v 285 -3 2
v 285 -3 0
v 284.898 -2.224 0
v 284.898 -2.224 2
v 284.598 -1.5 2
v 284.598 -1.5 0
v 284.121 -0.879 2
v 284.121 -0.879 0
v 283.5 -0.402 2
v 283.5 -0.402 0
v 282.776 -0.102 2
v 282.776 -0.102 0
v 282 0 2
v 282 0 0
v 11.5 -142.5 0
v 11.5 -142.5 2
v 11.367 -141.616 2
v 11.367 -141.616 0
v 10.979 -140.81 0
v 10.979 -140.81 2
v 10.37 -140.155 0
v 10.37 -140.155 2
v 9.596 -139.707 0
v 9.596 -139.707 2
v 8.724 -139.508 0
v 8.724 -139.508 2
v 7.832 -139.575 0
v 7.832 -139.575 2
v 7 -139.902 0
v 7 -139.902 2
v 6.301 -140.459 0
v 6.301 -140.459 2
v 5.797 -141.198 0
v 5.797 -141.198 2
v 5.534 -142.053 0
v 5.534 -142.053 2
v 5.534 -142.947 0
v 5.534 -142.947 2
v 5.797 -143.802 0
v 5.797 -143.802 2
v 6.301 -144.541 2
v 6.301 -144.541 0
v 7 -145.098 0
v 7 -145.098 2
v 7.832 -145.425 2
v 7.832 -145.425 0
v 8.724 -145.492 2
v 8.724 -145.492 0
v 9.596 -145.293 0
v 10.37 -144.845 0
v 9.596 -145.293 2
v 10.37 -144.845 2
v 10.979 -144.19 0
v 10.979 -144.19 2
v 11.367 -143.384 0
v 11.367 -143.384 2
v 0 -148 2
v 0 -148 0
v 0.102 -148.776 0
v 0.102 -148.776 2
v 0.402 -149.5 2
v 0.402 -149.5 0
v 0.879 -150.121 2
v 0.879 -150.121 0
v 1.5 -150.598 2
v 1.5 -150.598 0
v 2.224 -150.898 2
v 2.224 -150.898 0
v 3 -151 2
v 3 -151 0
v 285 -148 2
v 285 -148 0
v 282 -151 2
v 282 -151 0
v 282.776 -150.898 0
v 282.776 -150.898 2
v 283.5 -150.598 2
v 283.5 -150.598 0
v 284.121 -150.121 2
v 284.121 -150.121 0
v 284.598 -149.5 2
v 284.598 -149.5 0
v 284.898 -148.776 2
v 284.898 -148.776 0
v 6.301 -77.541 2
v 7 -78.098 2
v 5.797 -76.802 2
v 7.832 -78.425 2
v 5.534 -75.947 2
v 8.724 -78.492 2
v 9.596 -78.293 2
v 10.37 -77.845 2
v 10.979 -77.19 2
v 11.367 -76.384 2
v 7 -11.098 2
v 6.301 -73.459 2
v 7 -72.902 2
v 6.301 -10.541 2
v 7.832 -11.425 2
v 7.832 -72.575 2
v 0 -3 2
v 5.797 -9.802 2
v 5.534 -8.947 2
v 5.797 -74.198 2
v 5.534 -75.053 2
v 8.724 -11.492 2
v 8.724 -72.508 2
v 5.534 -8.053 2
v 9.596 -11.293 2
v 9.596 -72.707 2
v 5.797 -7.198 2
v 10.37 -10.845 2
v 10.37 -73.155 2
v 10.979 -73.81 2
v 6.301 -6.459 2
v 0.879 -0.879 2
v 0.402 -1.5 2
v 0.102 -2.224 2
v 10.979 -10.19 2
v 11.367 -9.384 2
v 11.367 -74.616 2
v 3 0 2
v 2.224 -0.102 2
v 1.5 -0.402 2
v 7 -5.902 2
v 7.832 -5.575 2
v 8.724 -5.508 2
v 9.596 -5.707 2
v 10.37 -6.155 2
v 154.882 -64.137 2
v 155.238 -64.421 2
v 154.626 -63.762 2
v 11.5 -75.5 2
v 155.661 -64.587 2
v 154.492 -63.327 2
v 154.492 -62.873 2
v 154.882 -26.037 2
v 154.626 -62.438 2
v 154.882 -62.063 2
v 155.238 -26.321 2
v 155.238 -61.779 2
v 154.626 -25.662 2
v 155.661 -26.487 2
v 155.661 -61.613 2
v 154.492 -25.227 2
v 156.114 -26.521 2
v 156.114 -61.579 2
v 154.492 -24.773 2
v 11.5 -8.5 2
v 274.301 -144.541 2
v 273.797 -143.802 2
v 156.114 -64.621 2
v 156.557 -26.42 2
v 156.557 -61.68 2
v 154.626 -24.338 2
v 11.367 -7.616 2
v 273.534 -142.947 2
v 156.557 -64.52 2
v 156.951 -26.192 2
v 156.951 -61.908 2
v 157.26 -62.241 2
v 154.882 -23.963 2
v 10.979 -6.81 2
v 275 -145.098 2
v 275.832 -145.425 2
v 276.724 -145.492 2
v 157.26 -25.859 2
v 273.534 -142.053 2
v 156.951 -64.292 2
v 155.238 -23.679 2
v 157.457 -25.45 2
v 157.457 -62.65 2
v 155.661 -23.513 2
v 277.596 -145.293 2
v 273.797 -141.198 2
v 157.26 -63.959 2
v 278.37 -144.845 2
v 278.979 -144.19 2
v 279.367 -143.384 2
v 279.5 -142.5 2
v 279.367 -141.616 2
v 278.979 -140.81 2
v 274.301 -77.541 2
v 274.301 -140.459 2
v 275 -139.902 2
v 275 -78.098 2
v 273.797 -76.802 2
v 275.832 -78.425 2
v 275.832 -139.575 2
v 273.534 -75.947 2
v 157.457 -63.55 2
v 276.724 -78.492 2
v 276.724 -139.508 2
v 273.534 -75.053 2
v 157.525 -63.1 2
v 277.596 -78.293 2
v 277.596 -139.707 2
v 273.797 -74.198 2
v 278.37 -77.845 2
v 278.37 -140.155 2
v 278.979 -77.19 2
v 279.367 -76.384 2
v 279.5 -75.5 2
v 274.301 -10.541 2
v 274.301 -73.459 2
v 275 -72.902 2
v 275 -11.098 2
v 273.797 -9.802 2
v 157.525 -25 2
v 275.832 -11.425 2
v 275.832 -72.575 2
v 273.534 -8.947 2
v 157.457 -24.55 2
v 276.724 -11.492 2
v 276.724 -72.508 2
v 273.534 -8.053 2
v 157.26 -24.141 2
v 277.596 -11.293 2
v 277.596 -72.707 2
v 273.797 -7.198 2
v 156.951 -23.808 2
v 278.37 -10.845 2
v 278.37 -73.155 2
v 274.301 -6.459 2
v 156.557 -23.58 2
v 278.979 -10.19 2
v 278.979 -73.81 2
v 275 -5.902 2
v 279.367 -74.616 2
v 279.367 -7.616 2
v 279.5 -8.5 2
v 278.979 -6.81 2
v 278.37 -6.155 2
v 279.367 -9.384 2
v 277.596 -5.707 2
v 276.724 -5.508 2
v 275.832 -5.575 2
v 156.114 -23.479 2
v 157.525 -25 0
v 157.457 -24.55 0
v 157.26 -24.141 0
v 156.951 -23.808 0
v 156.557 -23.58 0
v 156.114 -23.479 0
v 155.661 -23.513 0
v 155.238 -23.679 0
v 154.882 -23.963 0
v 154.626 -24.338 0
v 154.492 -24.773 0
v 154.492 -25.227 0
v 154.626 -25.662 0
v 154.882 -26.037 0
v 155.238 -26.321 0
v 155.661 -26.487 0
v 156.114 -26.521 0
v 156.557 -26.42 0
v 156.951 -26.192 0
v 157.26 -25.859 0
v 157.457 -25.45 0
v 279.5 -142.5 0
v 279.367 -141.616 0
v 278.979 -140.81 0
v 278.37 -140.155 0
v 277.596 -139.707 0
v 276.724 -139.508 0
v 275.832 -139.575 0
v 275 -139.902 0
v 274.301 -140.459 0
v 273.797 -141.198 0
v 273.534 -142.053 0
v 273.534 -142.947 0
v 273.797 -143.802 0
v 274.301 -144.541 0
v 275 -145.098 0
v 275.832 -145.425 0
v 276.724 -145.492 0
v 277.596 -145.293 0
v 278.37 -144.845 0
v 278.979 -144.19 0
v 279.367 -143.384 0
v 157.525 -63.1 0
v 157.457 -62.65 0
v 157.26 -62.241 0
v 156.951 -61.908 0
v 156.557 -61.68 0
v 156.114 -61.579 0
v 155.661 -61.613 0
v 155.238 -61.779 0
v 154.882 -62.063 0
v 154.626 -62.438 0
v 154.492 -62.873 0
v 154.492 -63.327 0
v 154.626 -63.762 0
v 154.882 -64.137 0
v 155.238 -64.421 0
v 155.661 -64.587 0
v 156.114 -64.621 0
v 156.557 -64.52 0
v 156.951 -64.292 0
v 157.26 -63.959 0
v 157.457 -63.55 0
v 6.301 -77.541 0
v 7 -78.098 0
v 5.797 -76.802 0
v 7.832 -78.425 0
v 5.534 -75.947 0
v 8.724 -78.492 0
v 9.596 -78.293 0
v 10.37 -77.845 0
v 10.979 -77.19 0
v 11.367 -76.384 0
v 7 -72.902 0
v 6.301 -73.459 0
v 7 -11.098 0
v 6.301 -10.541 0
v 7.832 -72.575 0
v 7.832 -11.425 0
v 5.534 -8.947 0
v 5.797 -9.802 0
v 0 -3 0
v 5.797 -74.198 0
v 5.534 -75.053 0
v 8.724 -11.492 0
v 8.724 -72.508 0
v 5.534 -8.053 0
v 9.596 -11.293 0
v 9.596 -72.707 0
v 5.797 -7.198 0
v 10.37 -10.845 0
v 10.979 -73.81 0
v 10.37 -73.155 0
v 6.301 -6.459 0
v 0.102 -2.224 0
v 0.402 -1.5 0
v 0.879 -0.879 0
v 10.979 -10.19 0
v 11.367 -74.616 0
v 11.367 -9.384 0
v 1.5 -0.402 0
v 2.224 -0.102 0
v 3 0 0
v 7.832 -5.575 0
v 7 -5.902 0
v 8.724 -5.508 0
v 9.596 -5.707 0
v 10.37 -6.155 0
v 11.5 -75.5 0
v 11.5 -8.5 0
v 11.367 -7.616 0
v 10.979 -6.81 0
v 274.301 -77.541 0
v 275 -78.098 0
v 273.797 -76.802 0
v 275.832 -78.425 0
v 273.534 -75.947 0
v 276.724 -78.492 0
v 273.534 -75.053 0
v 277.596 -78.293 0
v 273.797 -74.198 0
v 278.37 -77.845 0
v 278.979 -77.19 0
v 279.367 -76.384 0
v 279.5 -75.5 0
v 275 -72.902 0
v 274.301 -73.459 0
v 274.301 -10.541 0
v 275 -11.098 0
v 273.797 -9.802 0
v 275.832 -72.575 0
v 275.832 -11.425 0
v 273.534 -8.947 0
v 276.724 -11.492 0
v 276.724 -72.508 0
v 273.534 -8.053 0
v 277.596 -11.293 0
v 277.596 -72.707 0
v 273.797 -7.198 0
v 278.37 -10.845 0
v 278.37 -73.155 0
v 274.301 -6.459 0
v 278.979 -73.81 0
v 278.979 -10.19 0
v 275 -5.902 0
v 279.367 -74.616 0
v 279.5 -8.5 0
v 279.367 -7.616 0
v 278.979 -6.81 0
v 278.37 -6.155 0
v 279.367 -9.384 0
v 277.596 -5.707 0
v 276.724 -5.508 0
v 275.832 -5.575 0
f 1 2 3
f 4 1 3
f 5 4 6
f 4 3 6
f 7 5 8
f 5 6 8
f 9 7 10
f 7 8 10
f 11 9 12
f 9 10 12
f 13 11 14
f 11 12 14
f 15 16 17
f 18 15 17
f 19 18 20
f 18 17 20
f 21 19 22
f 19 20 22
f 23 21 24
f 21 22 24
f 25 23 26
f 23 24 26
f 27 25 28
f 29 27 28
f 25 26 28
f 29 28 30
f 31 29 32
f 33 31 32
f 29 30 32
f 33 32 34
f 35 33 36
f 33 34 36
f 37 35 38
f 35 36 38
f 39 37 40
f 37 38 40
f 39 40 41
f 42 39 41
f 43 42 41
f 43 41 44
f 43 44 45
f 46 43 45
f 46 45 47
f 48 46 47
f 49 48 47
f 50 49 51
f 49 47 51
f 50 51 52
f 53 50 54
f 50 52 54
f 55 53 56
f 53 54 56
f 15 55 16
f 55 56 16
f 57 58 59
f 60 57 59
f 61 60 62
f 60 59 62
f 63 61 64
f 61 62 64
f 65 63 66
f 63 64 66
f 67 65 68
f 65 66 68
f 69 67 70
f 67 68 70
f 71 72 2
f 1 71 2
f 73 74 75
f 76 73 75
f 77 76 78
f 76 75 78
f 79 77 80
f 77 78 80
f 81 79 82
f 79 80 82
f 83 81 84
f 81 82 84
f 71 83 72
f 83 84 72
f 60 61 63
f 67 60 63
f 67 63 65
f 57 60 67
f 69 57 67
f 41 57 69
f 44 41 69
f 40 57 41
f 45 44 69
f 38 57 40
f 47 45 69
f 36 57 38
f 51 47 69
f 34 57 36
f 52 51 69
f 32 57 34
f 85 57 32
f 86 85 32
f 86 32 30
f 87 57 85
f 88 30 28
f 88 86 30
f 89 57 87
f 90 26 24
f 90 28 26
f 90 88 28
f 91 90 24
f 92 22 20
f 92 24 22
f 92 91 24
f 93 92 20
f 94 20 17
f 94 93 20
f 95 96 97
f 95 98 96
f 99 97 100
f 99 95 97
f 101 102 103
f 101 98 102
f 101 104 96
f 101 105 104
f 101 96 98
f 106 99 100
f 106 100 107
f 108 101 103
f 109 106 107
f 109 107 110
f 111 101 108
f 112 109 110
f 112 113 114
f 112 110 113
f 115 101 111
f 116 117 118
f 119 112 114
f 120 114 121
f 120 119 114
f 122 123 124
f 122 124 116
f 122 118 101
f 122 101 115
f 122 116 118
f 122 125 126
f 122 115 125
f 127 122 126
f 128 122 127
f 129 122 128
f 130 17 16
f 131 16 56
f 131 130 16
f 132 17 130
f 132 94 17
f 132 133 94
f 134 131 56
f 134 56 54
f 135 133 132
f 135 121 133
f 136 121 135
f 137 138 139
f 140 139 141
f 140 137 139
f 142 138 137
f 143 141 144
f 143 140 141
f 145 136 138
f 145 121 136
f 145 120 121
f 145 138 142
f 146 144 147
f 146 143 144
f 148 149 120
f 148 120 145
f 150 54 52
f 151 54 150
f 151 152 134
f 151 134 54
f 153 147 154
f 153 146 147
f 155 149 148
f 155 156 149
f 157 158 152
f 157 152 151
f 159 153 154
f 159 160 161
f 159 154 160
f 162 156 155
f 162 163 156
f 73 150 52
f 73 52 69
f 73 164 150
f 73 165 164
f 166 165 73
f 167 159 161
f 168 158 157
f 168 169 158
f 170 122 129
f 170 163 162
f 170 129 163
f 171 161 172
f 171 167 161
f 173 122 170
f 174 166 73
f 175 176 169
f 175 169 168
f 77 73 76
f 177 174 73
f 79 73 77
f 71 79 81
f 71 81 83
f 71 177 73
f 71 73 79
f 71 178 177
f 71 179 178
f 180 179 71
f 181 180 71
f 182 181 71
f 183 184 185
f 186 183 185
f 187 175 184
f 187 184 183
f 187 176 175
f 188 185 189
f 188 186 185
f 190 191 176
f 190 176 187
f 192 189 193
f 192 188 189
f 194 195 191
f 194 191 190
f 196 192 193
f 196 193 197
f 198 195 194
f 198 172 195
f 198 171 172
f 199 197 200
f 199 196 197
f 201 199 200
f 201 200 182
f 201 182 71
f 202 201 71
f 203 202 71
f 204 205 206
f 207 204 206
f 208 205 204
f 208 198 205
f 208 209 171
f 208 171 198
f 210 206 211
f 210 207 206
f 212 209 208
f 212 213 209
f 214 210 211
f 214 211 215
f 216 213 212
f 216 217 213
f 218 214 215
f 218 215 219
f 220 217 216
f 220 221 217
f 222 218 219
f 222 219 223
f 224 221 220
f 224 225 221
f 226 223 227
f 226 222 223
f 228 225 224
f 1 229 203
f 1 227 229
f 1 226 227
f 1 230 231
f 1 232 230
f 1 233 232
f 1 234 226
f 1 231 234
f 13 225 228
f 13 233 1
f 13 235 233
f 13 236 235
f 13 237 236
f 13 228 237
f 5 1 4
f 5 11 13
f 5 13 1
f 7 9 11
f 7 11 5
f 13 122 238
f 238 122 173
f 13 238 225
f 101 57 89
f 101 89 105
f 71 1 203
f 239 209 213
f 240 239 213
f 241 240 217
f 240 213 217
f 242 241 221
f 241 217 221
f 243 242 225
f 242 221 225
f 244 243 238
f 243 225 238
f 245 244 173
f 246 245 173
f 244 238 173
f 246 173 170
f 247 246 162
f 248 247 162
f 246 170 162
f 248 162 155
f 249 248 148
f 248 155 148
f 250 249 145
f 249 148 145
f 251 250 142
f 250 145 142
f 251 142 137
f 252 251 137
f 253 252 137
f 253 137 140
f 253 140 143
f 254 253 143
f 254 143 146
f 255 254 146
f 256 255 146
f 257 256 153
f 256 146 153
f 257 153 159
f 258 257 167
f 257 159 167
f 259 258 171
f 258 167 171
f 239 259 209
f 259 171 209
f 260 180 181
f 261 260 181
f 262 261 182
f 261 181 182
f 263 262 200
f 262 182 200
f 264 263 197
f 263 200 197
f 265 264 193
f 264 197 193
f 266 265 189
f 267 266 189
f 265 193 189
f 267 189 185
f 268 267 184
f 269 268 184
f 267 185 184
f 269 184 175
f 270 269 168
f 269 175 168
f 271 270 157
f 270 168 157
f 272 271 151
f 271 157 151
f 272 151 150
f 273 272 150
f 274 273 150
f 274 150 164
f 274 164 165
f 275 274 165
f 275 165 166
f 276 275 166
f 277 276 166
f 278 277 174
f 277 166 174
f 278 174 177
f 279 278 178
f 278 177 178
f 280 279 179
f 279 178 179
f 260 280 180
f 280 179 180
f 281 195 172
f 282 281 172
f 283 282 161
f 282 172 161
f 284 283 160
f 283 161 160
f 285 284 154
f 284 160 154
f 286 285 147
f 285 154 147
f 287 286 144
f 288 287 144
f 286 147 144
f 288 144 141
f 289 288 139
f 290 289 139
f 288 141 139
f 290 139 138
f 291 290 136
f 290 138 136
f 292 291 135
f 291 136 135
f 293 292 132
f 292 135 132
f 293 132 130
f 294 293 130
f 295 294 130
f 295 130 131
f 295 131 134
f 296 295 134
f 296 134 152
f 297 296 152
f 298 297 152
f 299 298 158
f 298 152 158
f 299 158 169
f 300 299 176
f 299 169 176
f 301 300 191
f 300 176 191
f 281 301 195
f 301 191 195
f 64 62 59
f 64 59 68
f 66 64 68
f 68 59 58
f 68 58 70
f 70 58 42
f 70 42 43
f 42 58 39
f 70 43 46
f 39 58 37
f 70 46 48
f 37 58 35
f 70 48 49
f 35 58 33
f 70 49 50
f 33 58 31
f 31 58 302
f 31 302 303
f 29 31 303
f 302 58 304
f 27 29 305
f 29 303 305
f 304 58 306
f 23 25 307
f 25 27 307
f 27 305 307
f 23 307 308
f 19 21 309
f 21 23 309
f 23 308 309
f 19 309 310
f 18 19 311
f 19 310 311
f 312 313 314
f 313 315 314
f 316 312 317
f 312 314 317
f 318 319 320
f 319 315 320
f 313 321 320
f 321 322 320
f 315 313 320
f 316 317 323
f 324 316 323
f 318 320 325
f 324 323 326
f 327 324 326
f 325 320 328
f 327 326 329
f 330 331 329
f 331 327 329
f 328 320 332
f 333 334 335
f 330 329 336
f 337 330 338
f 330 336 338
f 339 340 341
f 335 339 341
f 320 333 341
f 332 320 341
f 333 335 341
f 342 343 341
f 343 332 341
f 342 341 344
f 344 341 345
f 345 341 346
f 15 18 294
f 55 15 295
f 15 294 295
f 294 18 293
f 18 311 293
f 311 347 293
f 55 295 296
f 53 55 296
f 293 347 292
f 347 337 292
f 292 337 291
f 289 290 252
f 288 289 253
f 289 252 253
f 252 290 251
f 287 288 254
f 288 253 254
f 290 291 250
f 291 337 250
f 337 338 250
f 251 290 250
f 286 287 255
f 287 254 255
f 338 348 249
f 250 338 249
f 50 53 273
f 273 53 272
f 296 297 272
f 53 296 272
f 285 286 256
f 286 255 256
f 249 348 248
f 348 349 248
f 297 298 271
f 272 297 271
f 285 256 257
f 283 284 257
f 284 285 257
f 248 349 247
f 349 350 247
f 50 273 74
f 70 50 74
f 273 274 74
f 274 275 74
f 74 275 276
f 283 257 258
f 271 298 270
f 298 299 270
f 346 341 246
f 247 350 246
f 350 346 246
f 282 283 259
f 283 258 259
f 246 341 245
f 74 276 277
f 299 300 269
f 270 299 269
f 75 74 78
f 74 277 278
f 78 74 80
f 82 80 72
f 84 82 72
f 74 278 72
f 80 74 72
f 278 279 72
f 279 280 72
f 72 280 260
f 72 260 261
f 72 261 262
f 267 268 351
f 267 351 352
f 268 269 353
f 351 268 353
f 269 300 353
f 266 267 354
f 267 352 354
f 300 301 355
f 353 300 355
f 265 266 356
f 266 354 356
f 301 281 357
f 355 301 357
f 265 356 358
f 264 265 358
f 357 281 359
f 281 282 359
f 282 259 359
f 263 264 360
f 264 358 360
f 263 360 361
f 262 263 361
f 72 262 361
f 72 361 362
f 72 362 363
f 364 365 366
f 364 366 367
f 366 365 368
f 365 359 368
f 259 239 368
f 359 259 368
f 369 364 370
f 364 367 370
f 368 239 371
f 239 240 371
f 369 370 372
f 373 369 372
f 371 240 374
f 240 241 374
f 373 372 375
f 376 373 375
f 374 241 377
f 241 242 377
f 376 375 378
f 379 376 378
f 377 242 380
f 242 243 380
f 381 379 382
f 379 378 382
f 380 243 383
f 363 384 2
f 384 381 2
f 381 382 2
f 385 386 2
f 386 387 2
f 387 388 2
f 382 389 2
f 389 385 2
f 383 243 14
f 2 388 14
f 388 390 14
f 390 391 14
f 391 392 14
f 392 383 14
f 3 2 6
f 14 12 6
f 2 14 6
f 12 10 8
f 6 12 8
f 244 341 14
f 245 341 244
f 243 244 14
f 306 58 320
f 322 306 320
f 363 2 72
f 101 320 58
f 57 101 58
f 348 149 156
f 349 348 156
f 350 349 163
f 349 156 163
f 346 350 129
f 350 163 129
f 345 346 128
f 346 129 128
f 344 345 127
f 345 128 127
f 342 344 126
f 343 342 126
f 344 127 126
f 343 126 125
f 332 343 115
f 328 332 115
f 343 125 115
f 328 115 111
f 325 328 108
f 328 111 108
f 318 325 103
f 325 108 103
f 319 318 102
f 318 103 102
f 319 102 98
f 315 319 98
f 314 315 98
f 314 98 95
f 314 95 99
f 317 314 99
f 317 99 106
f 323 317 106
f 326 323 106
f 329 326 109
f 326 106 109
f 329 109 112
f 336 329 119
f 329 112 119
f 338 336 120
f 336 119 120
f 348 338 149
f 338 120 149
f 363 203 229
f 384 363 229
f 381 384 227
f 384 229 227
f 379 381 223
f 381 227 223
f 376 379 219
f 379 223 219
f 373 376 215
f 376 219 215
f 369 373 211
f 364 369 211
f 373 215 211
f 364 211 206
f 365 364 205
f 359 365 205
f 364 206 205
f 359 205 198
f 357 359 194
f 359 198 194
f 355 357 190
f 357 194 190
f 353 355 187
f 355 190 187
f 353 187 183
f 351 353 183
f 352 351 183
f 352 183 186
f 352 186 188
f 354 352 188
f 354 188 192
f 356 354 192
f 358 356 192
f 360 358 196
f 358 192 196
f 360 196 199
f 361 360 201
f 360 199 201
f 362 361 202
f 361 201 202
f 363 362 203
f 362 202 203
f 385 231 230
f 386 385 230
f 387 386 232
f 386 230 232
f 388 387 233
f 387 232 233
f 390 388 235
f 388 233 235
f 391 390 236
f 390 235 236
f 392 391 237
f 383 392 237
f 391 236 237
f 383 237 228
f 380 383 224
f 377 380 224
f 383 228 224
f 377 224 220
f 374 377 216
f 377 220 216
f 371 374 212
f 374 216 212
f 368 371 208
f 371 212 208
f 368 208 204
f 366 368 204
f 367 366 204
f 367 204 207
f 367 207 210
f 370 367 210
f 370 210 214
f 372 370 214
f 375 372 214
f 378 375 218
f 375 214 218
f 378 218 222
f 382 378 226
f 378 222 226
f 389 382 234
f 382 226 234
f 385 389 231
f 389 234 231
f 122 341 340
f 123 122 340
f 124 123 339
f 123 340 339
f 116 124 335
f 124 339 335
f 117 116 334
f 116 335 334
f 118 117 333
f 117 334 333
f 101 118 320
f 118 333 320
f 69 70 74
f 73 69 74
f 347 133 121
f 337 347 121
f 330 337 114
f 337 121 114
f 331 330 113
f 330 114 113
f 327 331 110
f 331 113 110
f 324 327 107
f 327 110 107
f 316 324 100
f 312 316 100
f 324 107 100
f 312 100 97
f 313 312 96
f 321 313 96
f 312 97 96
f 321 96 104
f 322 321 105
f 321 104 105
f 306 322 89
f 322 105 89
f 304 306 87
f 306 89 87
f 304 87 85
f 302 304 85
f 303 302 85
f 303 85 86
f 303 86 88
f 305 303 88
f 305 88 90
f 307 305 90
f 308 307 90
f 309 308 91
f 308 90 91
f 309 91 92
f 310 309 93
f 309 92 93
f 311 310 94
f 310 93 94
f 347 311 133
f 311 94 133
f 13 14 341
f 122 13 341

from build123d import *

# Parameters (mm, degrees)
F1_DEPTH = 2
F2_R     = 3
F3_DEPTH = 2
F4_R     = 1.525
F5_DEPTH = 2


with BuildPart() as f1:
    # F0 (on Top) → F1 (new body)
    with BuildSketch(Plane.XY):
        with BuildLine():
            Line((282, 0), (3, 0))
            ThreePointArc((3, 0), (0.87868, -0.87868), (0, -3))
            Line((0, -3), (0, -148))
            ThreePointArc((0, -148), (0.87868, -150.12132), (3, -151))
            Line((3, -151), (282, -151))
            ThreePointArc((282, -151), (284.12132, -150.12132), (285, -148))
            Line((285, -148), (285, -3))
            ThreePointArc((285, -3), (284.12132, -0.87868), (282, 0))
        make_face()
    extrude(amount=F1_DEPTH)

    # F2 (on face) → F3 (cut)
    with BuildSketch(Plane.XY.offset(2)):
        with Locations((8.5, -8.5)):
            Circle(F2_R)
        with Locations((8.5, -75.5)):
            Circle(F2_R)
        with Locations((8.5, -142.5)):
            Circle(F2_R)
        with Locations((276.5, -142.5)):
            Circle(F2_R)
        with Locations((276.5, -75.5)):
            Circle(F2_R)
        with Locations((276.5, -8.5)):
            Circle(F2_R)
    extrude(amount=-F3_DEPTH, mode=Mode.SUBTRACT)

    # F4 (on face) → F5 (cut)
    with BuildSketch(Plane.XY.offset(2)):
        with Locations((156, -63.1)):
            Circle(F4_R)
        with Locations((156, -25)):
            Circle(F4_R)
    extrude(amount=-F5_DEPTH, mode=Mode.SUBTRACT)


solid = f1.part
